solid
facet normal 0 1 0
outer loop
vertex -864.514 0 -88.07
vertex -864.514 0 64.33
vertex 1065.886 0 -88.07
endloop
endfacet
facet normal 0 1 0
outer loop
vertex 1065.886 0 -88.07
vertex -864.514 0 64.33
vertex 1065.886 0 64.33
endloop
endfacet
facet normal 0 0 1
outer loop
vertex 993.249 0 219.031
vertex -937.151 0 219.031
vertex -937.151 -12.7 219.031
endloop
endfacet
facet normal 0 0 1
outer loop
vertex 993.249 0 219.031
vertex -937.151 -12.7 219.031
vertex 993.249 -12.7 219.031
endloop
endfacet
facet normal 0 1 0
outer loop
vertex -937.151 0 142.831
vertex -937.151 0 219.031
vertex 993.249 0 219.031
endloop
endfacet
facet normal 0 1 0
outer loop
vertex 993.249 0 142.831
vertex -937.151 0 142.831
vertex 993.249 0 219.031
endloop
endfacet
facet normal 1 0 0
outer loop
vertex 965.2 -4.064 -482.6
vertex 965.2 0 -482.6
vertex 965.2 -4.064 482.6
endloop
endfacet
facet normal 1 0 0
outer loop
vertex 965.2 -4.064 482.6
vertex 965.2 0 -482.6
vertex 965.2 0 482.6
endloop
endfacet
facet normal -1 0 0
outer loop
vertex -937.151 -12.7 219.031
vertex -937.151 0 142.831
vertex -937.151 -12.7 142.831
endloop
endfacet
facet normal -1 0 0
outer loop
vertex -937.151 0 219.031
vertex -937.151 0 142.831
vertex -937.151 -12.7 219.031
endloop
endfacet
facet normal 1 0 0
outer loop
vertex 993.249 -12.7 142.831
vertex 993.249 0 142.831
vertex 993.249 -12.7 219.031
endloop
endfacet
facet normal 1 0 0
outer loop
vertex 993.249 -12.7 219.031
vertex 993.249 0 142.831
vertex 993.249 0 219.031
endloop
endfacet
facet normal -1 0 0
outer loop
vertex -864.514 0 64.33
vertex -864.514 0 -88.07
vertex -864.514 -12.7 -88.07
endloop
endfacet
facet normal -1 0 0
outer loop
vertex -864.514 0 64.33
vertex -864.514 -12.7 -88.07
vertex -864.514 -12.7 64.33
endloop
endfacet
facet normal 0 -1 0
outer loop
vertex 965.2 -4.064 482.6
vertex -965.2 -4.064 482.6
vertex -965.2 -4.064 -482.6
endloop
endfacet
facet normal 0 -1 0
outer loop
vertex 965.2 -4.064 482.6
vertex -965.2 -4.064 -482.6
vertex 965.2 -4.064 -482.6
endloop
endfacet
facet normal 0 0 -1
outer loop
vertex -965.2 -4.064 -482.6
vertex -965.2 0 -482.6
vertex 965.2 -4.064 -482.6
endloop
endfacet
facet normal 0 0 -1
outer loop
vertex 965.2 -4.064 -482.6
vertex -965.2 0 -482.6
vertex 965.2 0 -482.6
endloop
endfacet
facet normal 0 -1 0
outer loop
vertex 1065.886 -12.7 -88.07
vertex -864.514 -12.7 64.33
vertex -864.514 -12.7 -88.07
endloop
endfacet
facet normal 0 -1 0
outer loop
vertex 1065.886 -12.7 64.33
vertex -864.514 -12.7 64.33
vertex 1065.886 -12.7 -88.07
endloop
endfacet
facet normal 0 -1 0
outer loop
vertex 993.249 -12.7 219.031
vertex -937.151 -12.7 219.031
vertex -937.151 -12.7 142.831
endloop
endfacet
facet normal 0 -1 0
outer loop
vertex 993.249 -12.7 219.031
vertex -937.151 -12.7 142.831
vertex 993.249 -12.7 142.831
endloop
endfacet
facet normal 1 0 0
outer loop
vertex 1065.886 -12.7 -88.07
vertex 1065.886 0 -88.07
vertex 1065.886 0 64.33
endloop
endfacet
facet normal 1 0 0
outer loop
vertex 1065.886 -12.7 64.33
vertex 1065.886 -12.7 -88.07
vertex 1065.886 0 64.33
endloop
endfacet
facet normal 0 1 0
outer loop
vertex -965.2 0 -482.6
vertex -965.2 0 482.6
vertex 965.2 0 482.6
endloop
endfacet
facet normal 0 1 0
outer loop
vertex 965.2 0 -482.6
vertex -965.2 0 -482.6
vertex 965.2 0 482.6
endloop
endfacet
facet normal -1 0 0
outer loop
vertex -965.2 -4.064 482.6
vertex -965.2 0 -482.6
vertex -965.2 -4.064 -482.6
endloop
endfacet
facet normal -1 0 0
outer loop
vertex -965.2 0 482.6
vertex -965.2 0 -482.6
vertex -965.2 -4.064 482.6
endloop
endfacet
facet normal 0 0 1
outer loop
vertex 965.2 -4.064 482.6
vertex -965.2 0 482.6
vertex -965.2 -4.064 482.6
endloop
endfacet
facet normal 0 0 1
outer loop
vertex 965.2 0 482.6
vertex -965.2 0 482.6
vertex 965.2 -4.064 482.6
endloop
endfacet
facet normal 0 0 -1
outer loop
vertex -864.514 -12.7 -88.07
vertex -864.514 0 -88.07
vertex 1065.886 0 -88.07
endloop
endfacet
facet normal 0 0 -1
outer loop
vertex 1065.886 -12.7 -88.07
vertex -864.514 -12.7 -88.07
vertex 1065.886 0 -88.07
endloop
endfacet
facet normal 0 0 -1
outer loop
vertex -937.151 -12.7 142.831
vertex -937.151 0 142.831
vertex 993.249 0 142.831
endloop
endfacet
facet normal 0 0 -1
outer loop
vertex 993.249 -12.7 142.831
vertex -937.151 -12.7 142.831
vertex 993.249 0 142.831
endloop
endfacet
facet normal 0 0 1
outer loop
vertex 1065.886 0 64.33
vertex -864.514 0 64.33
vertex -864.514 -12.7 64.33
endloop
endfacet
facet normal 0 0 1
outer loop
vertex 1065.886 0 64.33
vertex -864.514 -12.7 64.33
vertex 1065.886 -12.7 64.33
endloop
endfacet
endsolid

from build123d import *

# Parameters (mm, degrees)
F0_W     = 1930.4
F0_H     = 152.4
F1_DEPTH = 12.7
F2_W     = 1930.4
F2_H     = 76.2
F3_DEPTH = 12.7
F4_W     = 1930.4
F4_H     = 965.2
F5_DEPTH = 4.064


with BuildPart() as f1:
    # F0 (on Front) → F1 (new body)
    with BuildSketch(Plane.XZ):
        with Locations((100.686427, -11.869725)):
            Rectangle(F0_W, F0_H)
    extrude(amount=F1_DEPTH)


with BuildPart() as f3:
    # F2 (on Front) → F3 (new body)
    with BuildSketch(Plane.XZ):
        with Locations((28.048845, 180.93074)):
            Rectangle(F2_W, F2_H)
    extrude(amount=F3_DEPTH)


with BuildPart() as f5:
    # F4 (on Front) → F5 (new body)
    with BuildSketch(Plane.XZ):
        Rectangle(F4_W, F4_H)
    extrude(amount=F5_DEPTH)


solid = Compound([f1.part, f3.part, f5.part])
